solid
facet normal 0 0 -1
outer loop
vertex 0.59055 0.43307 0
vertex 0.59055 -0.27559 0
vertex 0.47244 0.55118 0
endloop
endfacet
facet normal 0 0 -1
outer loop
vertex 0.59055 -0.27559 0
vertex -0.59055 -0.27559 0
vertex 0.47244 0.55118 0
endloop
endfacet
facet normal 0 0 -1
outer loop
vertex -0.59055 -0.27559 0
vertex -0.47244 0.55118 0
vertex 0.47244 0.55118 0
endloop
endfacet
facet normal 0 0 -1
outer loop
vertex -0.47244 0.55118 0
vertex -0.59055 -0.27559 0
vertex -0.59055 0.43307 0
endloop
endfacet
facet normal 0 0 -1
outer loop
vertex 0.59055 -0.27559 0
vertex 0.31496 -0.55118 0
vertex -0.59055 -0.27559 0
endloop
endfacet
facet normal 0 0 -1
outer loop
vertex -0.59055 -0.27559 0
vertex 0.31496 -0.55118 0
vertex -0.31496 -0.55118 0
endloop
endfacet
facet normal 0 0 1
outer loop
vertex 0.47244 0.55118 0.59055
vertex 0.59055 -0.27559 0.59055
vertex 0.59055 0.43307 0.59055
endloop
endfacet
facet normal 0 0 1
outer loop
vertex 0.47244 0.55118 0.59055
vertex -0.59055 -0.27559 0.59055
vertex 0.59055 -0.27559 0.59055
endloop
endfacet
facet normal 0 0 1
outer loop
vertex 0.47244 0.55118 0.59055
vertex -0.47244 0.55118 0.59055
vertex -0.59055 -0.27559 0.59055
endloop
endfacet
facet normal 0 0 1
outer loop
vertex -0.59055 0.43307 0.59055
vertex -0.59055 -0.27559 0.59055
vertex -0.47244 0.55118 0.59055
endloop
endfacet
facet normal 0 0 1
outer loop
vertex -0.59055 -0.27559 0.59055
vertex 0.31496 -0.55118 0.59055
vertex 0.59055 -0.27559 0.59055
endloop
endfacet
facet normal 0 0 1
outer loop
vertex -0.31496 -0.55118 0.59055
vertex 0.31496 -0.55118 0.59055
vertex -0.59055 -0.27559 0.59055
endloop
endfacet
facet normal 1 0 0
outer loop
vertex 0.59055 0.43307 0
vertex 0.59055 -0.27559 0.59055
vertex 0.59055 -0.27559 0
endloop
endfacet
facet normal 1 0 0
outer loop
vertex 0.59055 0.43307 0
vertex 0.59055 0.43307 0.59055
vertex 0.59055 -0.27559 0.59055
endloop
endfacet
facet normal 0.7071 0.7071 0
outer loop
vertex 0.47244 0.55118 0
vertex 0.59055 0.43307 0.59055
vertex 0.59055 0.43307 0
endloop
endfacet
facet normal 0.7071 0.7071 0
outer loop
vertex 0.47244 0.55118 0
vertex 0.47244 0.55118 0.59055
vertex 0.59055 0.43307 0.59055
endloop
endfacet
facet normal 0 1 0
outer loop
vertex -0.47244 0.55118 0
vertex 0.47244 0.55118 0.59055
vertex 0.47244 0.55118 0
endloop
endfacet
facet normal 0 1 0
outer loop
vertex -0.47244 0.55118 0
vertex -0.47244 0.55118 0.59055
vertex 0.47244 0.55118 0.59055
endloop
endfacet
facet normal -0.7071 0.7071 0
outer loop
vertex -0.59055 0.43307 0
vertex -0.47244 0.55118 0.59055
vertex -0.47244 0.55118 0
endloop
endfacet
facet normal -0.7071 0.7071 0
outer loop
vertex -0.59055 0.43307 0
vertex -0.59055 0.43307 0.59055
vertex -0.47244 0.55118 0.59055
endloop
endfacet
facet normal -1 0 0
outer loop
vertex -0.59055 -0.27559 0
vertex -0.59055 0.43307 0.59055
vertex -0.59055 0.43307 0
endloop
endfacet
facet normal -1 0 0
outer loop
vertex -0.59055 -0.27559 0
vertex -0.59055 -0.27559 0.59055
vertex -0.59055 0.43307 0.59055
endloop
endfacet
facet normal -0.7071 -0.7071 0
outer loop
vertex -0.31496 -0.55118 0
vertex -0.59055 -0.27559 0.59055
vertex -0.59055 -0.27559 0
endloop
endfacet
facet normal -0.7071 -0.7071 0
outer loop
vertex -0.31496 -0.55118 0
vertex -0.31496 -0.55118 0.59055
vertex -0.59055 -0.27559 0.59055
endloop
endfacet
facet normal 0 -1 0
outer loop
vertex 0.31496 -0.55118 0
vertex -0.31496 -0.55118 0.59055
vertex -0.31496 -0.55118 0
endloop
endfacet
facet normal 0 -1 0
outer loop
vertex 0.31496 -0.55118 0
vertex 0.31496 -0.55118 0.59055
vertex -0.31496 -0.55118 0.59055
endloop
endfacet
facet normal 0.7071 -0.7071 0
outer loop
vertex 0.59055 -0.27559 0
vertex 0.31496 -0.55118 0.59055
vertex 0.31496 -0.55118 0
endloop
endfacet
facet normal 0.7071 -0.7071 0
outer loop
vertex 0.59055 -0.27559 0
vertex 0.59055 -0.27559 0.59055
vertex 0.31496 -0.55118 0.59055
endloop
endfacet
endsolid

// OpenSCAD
// file: defines.scad
// example012.stl is Mblock.stl, (c) 2009 Will Langford
// licensed under the Creative Commons - GNU GPL license.
// http://www.thingiverse.com/thing:753

//import("sim800c.stl", convexity=3);

// PCB

L = 3.0;
W = 2.8;
H = 1.5;
e = 1.35;
pin_fragments = 16;

scale = 1/2.54;
// file: Inductor_DEM2815C-body.scad
include <defines.scad>

f1 = 0.7;
f2 = 0.3;

scale(scale) color("Grey")
union() {
// Base

/*translate([-L/2, -W/2, 0])*/
  /*cube([L, W, H]);*/
  linear_extrude(height = H, center = false)
    polygon([
      [-L/2,-W/2+f1],
      [-L/2+f1,-W/2],
      [ L/2-f1,-W/2],
      [ L/2,-W/2+f1],
      [ L/2, W/2-f2],
      [ L/2-f2, W/2],
      [-L/2+f2,W/2],
      [-L/2,W/2-f2]
    ]);

// Body
/*translate([-L/2, -W/2, H-0.75])*/
    /*cylinder(r = 2.5, h = H, $fn = 64);*/

// Head
/*translate([-L/2, -W/2, H-0.75])
  linear_extrude(height = 0.75, center = false)
    polygon([[0,1],[0,5],[1,6],[5,6],[6,5],[6,1],[5,0],[1,0]]);*/

}
// main file
include <Inductor_DEM2815C-body.scad>
/*include <Inductor_DEM2815C-label.scad>*/
